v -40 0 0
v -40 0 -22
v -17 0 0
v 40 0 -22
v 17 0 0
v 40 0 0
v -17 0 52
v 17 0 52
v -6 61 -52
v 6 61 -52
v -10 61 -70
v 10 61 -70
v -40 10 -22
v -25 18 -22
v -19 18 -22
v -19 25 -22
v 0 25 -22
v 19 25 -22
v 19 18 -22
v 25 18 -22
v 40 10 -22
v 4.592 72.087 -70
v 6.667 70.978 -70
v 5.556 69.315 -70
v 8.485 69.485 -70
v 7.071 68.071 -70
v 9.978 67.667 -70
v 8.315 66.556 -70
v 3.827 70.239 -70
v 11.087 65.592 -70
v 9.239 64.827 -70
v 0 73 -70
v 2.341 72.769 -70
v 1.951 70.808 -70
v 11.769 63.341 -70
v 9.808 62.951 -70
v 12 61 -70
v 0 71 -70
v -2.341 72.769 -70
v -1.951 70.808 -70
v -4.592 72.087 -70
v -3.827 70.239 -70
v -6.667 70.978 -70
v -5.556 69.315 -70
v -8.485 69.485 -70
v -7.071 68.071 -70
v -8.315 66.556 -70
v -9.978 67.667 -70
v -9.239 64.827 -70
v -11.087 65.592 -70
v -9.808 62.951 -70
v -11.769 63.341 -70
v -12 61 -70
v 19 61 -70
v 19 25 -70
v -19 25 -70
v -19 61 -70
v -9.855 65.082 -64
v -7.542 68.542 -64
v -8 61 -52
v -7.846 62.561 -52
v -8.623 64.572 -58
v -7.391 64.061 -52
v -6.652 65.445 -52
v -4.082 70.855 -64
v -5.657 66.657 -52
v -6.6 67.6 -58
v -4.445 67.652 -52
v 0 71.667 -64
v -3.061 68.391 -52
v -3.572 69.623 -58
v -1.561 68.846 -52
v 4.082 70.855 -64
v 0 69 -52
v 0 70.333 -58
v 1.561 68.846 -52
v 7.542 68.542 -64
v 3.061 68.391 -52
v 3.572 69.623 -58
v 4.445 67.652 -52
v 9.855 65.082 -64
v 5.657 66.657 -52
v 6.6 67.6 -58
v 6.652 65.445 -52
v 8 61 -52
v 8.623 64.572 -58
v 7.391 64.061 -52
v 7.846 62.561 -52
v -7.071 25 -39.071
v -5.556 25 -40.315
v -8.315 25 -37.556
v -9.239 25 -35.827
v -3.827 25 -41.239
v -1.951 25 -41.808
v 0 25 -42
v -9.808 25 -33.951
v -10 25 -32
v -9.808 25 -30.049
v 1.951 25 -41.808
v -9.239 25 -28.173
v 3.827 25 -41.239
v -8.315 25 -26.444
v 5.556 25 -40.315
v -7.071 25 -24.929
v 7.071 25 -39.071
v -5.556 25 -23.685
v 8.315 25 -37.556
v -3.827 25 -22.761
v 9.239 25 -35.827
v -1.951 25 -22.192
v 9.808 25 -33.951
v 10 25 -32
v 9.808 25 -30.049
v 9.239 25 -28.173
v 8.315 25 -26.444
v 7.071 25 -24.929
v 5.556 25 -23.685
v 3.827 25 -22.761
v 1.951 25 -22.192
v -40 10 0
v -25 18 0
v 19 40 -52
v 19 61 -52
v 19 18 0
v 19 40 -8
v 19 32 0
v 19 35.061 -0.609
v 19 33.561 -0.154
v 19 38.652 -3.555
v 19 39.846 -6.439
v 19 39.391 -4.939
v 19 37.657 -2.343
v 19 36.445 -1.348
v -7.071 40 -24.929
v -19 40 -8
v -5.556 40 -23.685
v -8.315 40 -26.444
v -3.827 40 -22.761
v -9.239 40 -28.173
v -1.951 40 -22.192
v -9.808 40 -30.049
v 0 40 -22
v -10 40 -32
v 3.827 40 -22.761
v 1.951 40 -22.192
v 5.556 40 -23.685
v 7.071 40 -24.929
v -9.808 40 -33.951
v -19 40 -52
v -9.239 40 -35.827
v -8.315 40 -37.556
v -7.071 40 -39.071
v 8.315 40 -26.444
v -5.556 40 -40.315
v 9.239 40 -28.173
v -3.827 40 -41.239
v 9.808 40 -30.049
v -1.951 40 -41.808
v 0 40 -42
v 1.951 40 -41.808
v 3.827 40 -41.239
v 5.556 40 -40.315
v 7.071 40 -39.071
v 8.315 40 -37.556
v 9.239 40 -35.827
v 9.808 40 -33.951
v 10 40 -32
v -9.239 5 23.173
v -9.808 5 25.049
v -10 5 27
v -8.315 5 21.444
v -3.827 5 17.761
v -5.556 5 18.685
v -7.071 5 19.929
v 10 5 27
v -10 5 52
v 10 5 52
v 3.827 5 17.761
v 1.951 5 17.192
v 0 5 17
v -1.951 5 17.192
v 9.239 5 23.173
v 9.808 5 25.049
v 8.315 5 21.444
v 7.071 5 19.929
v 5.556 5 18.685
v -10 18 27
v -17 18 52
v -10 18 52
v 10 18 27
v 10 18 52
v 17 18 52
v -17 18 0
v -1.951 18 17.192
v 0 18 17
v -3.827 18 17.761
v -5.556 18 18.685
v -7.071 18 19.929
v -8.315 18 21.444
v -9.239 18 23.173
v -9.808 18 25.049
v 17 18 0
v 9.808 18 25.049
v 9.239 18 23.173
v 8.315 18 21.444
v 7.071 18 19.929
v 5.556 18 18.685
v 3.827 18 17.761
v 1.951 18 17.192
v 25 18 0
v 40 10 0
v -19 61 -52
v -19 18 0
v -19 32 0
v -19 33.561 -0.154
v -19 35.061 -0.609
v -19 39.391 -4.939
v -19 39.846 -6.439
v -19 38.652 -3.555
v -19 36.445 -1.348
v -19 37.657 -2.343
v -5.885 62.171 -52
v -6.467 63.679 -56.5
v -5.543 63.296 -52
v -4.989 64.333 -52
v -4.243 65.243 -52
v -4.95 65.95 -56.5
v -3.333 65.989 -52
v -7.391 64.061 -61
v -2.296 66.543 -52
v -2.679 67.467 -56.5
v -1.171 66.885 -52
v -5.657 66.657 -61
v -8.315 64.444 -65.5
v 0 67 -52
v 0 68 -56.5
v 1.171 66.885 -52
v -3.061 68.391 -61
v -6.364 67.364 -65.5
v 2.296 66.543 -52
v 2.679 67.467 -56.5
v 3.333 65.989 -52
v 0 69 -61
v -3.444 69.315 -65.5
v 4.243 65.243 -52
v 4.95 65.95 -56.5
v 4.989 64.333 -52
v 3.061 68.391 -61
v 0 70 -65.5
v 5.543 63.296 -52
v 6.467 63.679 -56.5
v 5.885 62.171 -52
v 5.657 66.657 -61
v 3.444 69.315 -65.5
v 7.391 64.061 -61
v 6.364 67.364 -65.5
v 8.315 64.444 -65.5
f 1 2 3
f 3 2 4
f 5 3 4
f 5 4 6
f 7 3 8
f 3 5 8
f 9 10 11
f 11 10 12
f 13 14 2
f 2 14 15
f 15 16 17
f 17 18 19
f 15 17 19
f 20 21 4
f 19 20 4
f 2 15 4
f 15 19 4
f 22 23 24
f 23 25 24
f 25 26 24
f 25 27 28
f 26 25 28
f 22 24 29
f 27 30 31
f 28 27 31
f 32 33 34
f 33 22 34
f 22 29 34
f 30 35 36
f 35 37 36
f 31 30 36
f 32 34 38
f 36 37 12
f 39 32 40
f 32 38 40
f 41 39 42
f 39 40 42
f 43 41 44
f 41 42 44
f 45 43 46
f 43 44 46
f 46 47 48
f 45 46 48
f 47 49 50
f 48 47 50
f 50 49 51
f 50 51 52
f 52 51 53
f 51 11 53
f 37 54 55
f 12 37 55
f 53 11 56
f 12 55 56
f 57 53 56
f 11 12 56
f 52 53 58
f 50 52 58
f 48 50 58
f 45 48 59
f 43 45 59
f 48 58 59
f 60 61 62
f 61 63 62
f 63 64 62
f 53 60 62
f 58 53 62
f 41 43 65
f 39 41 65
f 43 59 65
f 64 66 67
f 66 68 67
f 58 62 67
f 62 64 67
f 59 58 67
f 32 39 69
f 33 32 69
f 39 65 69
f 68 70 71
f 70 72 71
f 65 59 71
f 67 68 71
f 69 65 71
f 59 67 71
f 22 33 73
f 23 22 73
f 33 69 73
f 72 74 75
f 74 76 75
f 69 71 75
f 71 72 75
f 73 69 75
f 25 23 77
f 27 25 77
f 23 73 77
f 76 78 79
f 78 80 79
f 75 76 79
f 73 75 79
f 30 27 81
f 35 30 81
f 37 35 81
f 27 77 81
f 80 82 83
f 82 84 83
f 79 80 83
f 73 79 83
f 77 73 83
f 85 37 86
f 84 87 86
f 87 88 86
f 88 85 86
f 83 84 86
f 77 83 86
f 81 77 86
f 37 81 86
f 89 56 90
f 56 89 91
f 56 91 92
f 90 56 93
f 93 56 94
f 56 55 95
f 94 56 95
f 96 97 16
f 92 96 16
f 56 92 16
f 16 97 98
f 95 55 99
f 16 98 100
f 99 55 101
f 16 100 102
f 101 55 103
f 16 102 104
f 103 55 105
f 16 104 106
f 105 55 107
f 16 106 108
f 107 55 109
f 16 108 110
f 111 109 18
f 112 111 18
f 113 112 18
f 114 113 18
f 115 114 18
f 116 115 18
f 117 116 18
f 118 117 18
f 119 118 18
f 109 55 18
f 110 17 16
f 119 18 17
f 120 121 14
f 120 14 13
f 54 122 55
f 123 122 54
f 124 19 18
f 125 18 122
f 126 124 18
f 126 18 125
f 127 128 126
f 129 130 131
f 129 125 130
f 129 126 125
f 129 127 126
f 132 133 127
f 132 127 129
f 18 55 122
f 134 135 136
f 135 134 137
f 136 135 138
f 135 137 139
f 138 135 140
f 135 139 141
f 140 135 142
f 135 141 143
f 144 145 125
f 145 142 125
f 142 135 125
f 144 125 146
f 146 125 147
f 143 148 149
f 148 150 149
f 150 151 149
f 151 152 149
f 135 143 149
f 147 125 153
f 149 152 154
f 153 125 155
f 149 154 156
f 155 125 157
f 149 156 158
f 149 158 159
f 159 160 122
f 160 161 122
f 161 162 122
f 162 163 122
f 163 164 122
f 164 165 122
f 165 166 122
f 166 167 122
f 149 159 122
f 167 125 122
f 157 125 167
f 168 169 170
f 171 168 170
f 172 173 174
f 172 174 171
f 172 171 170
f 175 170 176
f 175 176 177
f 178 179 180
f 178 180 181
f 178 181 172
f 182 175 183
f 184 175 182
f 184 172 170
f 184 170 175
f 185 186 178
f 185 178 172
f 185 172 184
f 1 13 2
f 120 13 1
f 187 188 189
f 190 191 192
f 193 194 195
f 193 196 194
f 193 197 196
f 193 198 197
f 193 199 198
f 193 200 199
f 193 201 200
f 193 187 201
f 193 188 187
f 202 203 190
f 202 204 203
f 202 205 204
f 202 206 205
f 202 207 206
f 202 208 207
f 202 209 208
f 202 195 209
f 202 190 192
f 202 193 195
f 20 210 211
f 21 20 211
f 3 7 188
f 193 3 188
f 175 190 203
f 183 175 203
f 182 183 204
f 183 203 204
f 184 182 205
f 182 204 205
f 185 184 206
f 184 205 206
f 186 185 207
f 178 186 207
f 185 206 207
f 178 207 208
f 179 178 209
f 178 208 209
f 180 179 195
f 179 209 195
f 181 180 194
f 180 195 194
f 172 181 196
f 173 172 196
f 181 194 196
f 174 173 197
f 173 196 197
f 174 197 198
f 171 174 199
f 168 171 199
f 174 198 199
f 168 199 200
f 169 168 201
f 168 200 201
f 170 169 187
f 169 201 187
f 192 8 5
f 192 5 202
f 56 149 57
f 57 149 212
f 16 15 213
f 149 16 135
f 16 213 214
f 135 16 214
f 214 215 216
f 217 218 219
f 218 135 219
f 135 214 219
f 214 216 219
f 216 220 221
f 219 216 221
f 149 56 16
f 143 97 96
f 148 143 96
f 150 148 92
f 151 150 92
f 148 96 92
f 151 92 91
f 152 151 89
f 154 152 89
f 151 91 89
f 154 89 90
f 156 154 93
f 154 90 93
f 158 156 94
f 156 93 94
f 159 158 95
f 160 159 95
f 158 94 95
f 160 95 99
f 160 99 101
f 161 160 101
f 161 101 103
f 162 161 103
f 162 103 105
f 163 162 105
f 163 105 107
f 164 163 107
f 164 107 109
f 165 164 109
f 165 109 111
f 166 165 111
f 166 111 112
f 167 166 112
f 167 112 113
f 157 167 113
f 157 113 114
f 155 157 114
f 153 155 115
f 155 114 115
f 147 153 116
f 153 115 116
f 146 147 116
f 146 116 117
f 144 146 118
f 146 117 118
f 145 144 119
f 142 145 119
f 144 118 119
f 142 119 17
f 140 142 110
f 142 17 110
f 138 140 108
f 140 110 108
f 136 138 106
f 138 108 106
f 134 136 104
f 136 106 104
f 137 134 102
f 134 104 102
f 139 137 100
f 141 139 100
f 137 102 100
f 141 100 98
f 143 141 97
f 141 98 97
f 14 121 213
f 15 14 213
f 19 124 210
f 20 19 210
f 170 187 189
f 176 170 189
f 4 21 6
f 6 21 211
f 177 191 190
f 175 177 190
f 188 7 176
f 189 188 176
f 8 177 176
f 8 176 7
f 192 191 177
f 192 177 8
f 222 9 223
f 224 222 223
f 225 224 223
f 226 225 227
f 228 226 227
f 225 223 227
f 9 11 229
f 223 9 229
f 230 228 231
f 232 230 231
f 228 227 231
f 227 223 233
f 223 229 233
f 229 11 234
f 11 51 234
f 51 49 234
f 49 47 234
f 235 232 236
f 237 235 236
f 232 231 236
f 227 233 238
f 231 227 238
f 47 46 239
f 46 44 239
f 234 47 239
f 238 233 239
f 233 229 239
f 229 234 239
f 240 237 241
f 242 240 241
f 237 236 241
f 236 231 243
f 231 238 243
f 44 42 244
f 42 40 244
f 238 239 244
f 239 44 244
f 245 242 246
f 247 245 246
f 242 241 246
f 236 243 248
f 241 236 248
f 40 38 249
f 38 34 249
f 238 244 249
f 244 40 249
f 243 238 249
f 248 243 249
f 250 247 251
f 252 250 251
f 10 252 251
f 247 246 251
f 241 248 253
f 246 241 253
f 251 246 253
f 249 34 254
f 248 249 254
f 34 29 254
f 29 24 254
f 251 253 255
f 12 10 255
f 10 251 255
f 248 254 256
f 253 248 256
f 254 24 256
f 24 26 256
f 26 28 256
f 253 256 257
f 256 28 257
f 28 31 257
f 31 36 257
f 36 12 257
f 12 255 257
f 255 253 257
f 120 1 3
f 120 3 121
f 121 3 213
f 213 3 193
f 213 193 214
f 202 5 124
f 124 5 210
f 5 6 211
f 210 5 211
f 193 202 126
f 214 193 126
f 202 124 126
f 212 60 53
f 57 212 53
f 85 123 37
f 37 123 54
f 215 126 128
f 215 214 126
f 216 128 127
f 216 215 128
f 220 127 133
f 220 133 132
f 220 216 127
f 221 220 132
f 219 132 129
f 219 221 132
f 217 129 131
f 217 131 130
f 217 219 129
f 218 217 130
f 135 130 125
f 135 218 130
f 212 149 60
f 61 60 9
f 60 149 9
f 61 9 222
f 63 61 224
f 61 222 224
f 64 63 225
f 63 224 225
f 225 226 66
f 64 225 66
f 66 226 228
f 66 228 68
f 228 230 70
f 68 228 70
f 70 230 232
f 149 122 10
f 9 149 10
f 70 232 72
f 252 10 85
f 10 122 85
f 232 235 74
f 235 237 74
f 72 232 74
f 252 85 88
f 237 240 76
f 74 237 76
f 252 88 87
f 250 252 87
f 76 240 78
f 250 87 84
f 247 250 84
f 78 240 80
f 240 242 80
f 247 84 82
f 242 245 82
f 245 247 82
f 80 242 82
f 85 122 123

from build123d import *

# Parameters (mm, degrees)
BOSS_EXTRUDE1_DEPTH = 40
SKETCH2_W           = 21
SKETCH2_H           = 43
CUT_EXTRUDE1_DEPTH  = 80
CUT_EXTRUDE2_DEPTH  = 80
SKETCH4_W           = 34
SKETCH4_H           = 18
BOSS_EXTRUDE3_DEPTH = 52
CUT_EXTRUDE3_DEPTH  = 13
HOLE1_D             = 20
FILLET1_R           = 8


with BuildPart() as part:
    # Sketch1 → Boss-Extrude1 (new, symmetric)
    with BuildSketch(Plane(origin=(0, 0, 0), x_dir=(0, 0, -1), z_dir=(1, 0, 0))):
        Polygon((0, 0), (0, 40), (52, 40), (52, 61), (70, 61), (70, 25), (22, 25), (22, 0), align=None)
    extrude(amount=BOSS_EXTRUDE1_DEPTH, both=True)

    # Sketch2 → Cut-Extrude1 (cut)
    with BuildSketch(Plane.XY):
        with Locations((-29.5, 39.5)):
            Rectangle(SKETCH2_W, SKETCH2_H)
        with Locations((29.5, 39.5)):
            Rectangle(SKETCH2_W, SKETCH2_H)
    extrude(amount=-CUT_EXTRUDE1_DEPTH, mode=Mode.SUBTRACT)

    # Sketch3 → Cut-Extrude2 (cut)
    with BuildSketch(Plane.XY):
        Polygon((25, 18), (40, 10), (40, 18), align=None)
    cut_extrude2 = extrude(amount=-CUT_EXTRUDE2_DEPTH, mode=Mode.SUBTRACT)

    # Mirror1: Cut-Extrude2 across plane
    add(cut_extrude2.mirror(Plane(origin=(0, 0, 0), x_dir=(0, 0, 1), z_dir=(1, 0, 0))), mode=Mode.SUBTRACT)

    # Sketch4 → Boss-Extrude3 (add)
    with BuildSketch(Plane.XY):
        with Locations((0, 9)):
            Rectangle(SKETCH4_W, SKETCH4_H)
    extrude(amount=BOSS_EXTRUDE3_DEPTH)

    # Sketch5 → Cut-Extrude3 (cut)
    with BuildSketch(Plane(origin=(0, 18, 0), x_dir=(1, 0, 0), z_dir=(0, 1, 0))):
        with BuildLine():
            Line((-10, -27), (-10, -52))
            Line((-10, -52), (10, -52))
            Line((10, -52), (10, -27))
            ThreePointArc((10, -27), (0, -17), (-10, -27))
        make_face()
    extrude(amount=-CUT_EXTRUDE3_DEPTH, mode=Mode.SUBTRACT)

    # Sketch6 → Revolve1 (revolve)
    with BuildSketch(Plane(origin=(0, 61, 0), x_dir=(1, 0, 0), z_dir=(0, 1, 0))):
        Polygon((6, 52), (10, 70), (12, 70), (8, 52), align=None)
    revolve(axis=Axis((0, 61, 0), (0, 0, -1)))

    # Hole1 (through all)
    with Locations(Plane(origin=(0, 40, 0), x_dir=(1, 0, 0), z_dir=(0, 1, 0))):
        with Locations((0, 32)):
            Hole(HOLE1_D / 2)

    # Fillet1
    fillet1_edges = [part.edges().sort_by_distance(p)[0] for p in [
        (0, 40, 0),
    ]]
    fillet(fillet1_edges, radius=FILLET1_R)


solid = part.part
